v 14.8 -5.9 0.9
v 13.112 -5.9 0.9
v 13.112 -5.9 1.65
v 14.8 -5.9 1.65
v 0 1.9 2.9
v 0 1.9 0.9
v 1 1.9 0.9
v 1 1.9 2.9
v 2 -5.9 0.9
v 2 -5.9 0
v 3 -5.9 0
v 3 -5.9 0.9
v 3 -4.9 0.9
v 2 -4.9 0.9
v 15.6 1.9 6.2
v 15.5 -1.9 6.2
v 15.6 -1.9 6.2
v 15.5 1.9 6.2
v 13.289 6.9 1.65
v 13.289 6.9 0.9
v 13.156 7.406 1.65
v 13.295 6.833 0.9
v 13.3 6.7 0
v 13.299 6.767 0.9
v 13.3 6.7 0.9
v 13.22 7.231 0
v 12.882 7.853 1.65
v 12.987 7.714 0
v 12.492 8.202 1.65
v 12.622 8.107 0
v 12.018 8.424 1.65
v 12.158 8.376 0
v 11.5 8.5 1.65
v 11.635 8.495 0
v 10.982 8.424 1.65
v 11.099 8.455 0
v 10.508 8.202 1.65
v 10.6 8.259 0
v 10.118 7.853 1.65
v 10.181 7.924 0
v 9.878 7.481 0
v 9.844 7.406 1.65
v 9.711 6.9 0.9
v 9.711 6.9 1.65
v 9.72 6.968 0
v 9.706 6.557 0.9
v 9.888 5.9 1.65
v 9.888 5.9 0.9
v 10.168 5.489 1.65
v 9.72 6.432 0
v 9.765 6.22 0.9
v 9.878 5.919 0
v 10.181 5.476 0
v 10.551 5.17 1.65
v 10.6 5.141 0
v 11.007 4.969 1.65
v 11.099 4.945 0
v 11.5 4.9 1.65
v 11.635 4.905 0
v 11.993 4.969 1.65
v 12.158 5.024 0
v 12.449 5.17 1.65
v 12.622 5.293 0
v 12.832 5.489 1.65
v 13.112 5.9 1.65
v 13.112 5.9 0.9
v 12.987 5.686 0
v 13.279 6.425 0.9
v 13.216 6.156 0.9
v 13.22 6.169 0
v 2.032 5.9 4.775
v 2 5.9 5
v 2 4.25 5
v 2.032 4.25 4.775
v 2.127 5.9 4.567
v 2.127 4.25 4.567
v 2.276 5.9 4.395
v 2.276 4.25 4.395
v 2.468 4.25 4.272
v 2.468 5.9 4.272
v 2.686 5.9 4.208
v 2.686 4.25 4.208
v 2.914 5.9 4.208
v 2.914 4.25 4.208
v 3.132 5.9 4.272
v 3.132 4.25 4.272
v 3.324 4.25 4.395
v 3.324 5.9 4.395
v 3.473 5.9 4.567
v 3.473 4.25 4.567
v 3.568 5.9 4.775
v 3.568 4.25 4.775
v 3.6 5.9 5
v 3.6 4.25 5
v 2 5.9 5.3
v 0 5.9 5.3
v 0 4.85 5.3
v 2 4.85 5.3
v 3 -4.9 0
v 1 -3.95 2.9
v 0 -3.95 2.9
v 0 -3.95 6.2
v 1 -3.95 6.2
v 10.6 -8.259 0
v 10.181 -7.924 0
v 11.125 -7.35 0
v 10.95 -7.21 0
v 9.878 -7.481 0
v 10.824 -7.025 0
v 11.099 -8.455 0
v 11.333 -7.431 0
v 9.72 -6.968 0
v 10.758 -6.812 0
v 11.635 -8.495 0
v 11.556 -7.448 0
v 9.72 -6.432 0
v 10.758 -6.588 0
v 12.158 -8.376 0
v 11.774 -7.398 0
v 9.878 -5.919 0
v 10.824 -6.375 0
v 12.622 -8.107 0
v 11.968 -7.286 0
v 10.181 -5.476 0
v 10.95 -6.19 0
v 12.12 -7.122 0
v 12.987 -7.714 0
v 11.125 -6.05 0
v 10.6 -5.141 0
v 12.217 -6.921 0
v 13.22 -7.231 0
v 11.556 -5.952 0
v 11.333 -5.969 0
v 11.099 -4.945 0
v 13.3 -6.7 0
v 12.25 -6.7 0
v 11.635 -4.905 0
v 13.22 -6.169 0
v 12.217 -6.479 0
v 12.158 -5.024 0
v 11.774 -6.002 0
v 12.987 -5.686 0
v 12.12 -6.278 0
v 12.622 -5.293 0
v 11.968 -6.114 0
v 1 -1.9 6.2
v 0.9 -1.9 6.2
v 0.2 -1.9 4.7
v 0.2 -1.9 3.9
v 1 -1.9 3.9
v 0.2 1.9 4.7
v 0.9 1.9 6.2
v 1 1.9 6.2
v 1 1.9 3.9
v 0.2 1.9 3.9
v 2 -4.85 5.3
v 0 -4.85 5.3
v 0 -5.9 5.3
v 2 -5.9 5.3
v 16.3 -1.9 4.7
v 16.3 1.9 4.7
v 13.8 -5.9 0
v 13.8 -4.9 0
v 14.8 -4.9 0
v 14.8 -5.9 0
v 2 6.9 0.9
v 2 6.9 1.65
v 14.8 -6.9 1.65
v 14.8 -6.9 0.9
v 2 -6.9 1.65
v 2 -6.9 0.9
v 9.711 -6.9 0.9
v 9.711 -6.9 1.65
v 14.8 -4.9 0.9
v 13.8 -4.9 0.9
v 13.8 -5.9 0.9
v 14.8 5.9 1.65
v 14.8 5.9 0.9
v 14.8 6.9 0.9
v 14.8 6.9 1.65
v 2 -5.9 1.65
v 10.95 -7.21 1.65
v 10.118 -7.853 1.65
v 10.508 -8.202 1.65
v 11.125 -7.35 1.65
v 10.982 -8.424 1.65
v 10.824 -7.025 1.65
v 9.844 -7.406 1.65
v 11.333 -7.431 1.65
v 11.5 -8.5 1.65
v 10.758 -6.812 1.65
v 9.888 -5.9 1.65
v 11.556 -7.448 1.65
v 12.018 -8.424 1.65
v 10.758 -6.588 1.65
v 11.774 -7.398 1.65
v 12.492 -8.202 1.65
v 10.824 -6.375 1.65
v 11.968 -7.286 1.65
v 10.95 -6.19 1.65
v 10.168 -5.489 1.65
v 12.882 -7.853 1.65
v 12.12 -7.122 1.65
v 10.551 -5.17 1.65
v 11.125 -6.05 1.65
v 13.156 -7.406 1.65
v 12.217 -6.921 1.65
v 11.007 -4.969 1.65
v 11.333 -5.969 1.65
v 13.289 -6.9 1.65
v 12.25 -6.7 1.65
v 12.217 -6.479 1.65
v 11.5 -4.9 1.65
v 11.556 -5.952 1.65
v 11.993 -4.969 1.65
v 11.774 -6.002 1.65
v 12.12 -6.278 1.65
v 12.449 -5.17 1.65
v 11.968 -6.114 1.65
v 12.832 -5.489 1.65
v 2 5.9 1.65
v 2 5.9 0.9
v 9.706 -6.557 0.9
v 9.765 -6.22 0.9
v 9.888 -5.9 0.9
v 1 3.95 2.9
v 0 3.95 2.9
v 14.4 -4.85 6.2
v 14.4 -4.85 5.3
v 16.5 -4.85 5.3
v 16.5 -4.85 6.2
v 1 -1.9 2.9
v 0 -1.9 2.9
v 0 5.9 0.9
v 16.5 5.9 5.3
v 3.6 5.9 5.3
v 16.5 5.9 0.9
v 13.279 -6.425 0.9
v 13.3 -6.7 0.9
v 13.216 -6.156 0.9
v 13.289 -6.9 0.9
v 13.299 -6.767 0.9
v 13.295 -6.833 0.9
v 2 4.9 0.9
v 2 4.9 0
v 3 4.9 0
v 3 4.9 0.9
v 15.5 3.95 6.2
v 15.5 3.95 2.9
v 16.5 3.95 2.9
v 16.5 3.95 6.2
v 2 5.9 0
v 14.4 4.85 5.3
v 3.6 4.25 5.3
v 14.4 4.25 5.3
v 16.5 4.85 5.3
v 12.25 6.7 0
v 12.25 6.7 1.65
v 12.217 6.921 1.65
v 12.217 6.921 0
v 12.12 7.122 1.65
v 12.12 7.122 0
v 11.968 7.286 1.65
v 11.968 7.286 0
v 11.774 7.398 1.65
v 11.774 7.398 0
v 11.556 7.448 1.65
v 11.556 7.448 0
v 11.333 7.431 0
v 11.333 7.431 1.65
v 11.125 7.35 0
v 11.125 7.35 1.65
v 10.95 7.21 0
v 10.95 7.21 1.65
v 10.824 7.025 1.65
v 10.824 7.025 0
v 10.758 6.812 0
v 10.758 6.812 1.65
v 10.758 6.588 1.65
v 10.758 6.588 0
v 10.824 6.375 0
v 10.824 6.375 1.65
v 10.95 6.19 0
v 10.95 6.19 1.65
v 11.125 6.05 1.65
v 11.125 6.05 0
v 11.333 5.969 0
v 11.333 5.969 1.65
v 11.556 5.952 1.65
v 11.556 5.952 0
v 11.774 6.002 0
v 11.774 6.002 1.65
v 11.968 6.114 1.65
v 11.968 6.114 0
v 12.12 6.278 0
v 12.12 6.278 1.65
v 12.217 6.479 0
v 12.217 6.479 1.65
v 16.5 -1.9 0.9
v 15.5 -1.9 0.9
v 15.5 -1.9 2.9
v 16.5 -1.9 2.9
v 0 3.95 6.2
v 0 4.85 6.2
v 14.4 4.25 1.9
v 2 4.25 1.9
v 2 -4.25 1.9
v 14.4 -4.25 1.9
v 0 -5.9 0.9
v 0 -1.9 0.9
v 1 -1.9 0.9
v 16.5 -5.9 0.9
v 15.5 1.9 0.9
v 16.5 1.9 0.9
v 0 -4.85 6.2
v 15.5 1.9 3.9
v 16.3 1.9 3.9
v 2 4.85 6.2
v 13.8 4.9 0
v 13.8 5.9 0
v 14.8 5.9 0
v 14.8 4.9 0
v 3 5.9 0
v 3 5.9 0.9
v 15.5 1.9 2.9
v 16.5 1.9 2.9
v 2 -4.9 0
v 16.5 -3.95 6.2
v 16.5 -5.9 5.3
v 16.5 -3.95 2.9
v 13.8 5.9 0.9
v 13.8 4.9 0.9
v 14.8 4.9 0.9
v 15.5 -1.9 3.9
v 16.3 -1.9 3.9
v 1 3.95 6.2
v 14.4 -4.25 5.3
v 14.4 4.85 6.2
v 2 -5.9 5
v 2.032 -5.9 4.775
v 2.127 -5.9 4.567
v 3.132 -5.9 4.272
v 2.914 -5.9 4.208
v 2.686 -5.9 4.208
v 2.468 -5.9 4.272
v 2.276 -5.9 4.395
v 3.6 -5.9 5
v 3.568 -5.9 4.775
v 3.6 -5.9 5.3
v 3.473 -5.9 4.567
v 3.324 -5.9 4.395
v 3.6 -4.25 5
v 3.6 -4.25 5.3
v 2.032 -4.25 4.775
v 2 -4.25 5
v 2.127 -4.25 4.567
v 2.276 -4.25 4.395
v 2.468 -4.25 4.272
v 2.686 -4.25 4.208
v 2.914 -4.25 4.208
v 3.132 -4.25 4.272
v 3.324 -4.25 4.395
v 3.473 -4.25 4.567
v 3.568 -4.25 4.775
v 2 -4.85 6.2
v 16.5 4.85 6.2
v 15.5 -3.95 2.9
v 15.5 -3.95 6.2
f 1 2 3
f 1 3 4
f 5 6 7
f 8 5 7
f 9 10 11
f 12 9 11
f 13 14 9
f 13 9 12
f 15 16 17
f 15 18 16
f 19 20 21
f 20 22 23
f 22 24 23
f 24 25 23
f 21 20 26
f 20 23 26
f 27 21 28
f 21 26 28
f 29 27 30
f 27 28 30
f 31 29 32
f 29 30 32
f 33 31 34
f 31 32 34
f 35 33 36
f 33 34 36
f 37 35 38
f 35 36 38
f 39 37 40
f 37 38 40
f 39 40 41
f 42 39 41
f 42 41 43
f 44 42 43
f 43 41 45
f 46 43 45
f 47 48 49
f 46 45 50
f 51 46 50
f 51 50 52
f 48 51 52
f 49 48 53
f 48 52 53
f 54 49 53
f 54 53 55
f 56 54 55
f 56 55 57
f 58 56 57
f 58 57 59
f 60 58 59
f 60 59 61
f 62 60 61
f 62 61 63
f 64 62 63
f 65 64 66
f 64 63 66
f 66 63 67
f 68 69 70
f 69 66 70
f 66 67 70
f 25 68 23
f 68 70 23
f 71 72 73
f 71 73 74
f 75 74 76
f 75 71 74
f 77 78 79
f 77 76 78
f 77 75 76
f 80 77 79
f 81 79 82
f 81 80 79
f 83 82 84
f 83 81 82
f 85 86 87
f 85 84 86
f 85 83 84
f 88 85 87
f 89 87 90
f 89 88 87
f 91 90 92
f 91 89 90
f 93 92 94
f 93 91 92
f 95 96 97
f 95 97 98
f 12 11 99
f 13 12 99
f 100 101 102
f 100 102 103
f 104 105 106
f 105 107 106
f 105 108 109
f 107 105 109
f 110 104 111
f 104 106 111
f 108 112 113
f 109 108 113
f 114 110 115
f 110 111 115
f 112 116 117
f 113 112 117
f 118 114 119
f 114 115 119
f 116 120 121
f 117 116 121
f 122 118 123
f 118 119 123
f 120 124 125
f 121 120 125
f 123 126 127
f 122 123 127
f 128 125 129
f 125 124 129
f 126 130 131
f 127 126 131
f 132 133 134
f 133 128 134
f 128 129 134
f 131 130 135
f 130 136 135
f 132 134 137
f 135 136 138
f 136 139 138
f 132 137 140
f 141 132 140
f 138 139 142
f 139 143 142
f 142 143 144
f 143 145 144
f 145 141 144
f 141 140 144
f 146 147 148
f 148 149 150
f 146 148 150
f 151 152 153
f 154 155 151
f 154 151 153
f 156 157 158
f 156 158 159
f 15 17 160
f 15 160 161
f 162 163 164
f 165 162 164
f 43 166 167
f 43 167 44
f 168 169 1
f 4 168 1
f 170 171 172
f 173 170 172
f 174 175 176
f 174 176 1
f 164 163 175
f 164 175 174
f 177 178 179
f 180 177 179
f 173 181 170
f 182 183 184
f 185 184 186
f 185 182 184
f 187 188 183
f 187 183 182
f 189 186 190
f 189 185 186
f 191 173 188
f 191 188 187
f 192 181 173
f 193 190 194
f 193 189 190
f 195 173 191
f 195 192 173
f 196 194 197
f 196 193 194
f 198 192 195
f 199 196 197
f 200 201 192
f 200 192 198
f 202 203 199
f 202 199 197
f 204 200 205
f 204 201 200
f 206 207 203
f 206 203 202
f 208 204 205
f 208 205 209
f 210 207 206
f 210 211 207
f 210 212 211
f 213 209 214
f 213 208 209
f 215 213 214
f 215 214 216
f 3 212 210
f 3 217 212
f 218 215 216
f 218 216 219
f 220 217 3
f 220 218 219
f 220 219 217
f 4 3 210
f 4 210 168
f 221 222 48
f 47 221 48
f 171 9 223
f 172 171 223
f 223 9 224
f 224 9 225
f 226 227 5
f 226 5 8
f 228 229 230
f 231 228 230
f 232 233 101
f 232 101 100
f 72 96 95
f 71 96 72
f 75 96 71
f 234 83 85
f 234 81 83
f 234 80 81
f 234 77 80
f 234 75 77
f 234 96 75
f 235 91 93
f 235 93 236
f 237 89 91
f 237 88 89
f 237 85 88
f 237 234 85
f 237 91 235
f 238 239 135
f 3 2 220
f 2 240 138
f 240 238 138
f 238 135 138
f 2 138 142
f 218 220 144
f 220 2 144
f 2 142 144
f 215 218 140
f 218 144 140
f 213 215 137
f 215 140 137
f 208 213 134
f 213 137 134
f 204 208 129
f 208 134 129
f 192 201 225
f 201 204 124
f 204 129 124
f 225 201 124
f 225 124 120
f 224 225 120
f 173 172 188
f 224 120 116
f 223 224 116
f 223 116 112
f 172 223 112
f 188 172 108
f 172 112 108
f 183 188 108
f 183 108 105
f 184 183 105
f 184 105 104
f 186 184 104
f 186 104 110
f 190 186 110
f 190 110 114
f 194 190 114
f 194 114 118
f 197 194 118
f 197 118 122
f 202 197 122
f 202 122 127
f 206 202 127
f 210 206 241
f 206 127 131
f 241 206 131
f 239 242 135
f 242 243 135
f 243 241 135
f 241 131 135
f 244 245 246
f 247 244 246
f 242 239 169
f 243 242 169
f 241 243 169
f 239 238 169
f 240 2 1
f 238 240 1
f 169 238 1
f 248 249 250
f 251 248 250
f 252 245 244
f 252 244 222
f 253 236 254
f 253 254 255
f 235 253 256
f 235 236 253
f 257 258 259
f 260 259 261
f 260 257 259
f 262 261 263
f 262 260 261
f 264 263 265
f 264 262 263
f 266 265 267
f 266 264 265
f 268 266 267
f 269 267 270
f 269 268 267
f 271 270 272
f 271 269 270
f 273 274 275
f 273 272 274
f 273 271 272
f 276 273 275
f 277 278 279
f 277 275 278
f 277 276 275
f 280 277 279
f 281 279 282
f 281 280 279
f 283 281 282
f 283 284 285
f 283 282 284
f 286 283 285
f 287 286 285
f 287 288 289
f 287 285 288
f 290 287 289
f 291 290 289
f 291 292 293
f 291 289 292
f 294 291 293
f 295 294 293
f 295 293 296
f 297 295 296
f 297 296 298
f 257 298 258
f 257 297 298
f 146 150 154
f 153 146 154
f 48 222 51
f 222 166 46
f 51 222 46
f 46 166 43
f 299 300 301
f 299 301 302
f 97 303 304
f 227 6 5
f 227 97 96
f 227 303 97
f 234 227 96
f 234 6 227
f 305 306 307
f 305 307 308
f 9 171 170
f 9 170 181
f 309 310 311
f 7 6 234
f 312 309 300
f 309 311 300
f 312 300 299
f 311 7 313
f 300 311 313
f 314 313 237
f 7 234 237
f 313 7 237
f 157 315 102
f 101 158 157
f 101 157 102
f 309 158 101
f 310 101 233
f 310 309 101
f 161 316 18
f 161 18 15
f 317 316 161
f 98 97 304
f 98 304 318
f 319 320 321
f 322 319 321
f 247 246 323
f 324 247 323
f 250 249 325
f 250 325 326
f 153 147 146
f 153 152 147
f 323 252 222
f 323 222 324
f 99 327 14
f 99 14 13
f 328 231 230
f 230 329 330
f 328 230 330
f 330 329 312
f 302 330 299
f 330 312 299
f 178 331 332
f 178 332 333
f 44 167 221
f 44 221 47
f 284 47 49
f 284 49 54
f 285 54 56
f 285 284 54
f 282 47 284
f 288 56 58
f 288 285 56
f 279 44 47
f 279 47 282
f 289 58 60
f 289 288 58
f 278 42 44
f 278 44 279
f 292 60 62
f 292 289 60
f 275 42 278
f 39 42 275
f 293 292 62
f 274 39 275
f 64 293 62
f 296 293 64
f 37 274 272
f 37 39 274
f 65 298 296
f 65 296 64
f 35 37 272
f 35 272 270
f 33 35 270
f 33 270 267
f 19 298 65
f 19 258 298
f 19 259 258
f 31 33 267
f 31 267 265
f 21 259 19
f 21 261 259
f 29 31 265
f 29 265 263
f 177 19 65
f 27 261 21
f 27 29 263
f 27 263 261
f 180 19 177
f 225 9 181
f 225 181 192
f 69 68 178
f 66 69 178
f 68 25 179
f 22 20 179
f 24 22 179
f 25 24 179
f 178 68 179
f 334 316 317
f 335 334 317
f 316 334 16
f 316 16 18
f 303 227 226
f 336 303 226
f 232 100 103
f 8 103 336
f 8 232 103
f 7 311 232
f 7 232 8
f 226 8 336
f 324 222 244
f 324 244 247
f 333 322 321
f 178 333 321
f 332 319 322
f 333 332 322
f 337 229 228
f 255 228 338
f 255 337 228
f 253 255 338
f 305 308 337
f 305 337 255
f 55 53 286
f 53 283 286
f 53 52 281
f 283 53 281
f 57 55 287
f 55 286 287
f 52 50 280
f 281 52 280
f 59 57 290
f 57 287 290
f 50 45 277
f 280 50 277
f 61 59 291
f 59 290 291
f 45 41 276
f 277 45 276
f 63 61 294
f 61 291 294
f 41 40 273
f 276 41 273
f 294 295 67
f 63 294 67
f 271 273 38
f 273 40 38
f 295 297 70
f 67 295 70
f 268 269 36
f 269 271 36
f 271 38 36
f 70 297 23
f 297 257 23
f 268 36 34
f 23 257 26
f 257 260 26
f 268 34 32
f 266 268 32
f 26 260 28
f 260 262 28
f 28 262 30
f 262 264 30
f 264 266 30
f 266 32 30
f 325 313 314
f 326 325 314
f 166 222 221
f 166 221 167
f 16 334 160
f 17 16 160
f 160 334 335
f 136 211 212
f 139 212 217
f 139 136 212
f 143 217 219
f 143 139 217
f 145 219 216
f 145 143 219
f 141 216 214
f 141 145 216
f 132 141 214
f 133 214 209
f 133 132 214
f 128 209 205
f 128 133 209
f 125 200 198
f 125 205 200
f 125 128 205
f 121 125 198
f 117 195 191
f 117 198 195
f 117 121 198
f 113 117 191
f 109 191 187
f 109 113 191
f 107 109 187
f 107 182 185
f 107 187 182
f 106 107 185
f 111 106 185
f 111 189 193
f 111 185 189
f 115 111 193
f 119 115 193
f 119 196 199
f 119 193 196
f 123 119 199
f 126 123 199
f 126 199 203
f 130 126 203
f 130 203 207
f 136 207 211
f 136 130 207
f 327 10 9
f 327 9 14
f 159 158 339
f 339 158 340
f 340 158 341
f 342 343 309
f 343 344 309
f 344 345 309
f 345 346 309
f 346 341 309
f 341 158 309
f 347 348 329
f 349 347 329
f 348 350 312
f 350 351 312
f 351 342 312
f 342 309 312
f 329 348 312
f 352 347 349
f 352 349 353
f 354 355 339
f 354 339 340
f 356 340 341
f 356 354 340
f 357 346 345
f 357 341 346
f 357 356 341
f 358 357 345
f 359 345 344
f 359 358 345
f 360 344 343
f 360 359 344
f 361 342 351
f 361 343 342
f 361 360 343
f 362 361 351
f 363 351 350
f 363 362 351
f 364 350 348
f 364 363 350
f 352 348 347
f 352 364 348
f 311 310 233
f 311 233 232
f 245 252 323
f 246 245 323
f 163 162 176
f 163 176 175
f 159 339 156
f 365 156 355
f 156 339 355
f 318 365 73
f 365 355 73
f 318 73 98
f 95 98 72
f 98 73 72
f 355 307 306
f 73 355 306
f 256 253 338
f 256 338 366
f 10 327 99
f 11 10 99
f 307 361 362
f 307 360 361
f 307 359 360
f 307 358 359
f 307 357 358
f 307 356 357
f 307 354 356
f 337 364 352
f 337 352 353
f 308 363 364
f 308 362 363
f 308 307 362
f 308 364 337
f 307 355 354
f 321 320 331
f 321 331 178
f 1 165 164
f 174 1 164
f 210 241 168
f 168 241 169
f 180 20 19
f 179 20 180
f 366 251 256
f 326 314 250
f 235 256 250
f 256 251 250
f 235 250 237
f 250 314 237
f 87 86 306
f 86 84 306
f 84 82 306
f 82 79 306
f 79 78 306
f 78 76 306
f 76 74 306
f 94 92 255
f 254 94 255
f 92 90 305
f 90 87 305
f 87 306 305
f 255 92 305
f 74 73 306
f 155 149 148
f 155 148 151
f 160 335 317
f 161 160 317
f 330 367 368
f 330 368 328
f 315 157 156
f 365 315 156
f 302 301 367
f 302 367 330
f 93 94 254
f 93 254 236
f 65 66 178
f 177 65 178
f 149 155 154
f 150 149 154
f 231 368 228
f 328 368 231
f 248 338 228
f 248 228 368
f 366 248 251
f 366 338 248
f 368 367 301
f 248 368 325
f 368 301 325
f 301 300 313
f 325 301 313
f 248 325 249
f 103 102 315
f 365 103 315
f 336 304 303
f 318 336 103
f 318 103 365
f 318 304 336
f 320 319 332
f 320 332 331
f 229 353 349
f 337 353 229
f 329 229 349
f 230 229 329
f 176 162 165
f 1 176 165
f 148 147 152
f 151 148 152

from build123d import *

# Parameters (mm, degrees)
CYLINDER003_R     = 0.75
CYLINDER003_DEPTH = 10
CYLINDER_R        = 1.8
CYLINDER_DEPTH    = 1.65
BOX006_W          = 12.8
BOX006_H          = 1
BOX006_DEPTH      = 0.75
CYLINDER002_R     = 0.75
CYLINDER002_DEPTH = 10
BOX005_W          = 12.8
BOX005_H          = 1
BOX005_DEPTH      = 0.75
CYLINDER001_R     = 1.8
CYLINDER001_DEPTH = 1.65
BOX002_W          = 1
BOX002_H          = 1
BOX002_DEPTH      = 0.9
BOX003_W          = 1
BOX003_H          = 1
BOX003_DEPTH      = 0.9
BOX001_W          = 1
BOX001_H          = 1
BOX001_DEPTH      = 0.9
BOX004_W          = 1
BOX004_H          = 1
BOX004_DEPTH      = 0.9
BOX015_W          = 0.8
BOX015_H          = 3.8
BOX015_DEPTH      = 2.3
CHAMFER_SIZE2     = 0.7
CHAMFER_SIZE      = 1.5
BOX016_W          = 0.8
BOX016_H          = 3.8
BOX016_DEPTH      = 2.3
CHAMFER001_SIZE2  = 0.7
CHAMFER001_SIZE   = 1.5
BOX019_W          = 12.3
BOX019_H          = 9.7
BOX019_DEPTH      = 1
CYLINDER004_R     = 0.8
CYLINDER004_DEPTH = 20
BOX018_W          = 1.6
BOX018_H          = 20
BOX018_DEPTH      = 3
BOX017_W          = 12.4
BOX017_H          = 8.5
BOX017_DEPTH      = 4.3
BOX013_W          = 1
BOX013_H          = 2.05
BOX013_DEPTH      = 3.3
BOX014_W          = 1
BOX014_H          = 2.05
BOX014_DEPTH      = 3.3
BOX011_W          = 1
BOX011_H          = 2.05
BOX011_DEPTH      = 3.3
BOX012_W          = 1
BOX012_H          = 2.05
BOX012_DEPTH      = 3.3
BOX010_W          = 1
BOX010_H          = 3.8
BOX010_DEPTH      = 5.3
BOX009_W          = 1
BOX009_H          = 3.8
BOX009_DEPTH      = 5.3
BOX007_W          = 16.5
BOX007_H          = 1.05
BOX007_DEPTH      = 1
BOX008_W          = 16.5
BOX008_H          = 1.05
BOX008_DEPTH      = 1
BOX_W             = 16.5
BOX_H             = 11.8
BOX_DEPTH         = 5.3


with BuildPart() as cylinder003:
    # Cylinder003 → Cylinder003 (new body)
    with BuildSketch(Plane(origin=(11.5, -6.7, 0), x_dir=(1, 0, 0), z_dir=(0, 0, 1))):
        Circle(CYLINDER003_R)
    extrude(amount=CYLINDER003_DEPTH)


with BuildPart() as cylinder:
    # Cylinder → Cylinder (new body)
    with BuildSketch(Plane(origin=(11.5, -6.7, 0), x_dir=(1, 0, 0), z_dir=(0, 0, 1))):
        Circle(CYLINDER_R)
    extrude(amount=CYLINDER_DEPTH)


with BuildPart() as cut:
    # Box006 → Box006 (new body)
    with BuildSketch(Plane(origin=(2, -6.9, 0.9), x_dir=(1, 0, 0), z_dir=(0, 0, 1))):
        with Locations((6.4, 0.5)):
            Rectangle(BOX006_W, BOX006_H)
    extrude(amount=BOX006_DEPTH)

    # Fusion: union Cylinder
    add(cylinder.part)

    # Cut: cut Cylinder003
    add(cylinder003.part, mode=Mode.SUBTRACT)


with BuildPart() as cylinder002:
    # Cylinder002 → Cylinder002 (new body)
    with BuildSketch(Plane(origin=(11.5, 6.7, 0), x_dir=(1, 0, 0), z_dir=(0, 0, 1))):
        Circle(CYLINDER002_R)
    extrude(amount=CYLINDER002_DEPTH)


with BuildPart() as sk1:
    # Box005 → Box005 (new body)
    with BuildSketch(Plane(origin=(2, 5.9, 0.9), x_dir=(1, 0, 0), z_dir=(0, 0, 1))):
        with Locations((6.4, 0.5)):
            Rectangle(BOX005_W, BOX005_H)
    extrude(amount=BOX005_DEPTH)


with BuildPart() as cut001:
    # Cylinder001 → Cylinder001 (new body)
    with BuildSketch(Plane(origin=(11.5, 6.7, 0), x_dir=(1, 0, 0), z_dir=(0, 0, 1))):
        Circle(CYLINDER001_R)
    extrude(amount=CYLINDER001_DEPTH)

    # Fusion001: union sk1
    add(sk1.part)

    # Cut001: cut Cylinder002
    add(cylinder002.part, mode=Mode.SUBTRACT)


with BuildPart() as cube002:
    # Box002 → Box002 (new body)
    with BuildSketch(Plane(origin=(13.8, 4.9, 0), x_dir=(1, 0, 0), z_dir=(0, 0, 1))):
        with Locations((0.5, 0.5)):
            Rectangle(BOX002_W, BOX002_H)
    extrude(amount=BOX002_DEPTH)


with BuildPart() as cube003:
    # Box003 → Box003 (new body)
    with BuildSketch(Plane(origin=(2, -5.9, 0), x_dir=(1, 0, 0), z_dir=(0, 0, 1))):
        with Locations((0.5, 0.5)):
            Rectangle(BOX003_W, BOX003_H)
    extrude(amount=BOX003_DEPTH)


with BuildPart() as cube001:
    # Box001 → Box001 (new body)
    with BuildSketch(Plane(origin=(2, 4.9, 0), x_dir=(1, 0, 0), z_dir=(0, 0, 1))):
        with Locations((0.5, 0.5)):
            Rectangle(BOX001_W, BOX001_H)
    extrude(amount=BOX001_DEPTH)


with BuildPart() as pods:
    # Box004 → Box004 (new body)
    with BuildSketch(Plane(origin=(13.8, -5.9, 0), x_dir=(1, 0, 0), z_dir=(0, 0, 1))):
        with Locations((0.5, 0.5)):
            Rectangle(BOX004_W, BOX004_H)
    extrude(amount=BOX004_DEPTH)

    # Fusion004: union Cube002, Cube003, Cube001
    add(cube002.part)
    add(cube003.part)
    add(cube001.part)


with BuildPart() as chamfer_body:
    # Box015 → Box015 (new body)
    with BuildSketch(Plane(origin=(0.2, -1.9, 3.9), x_dir=(1, 0, 0), z_dir=(0, 0, 1))):
        with Locations((0.4, 1.9)):
            Rectangle(BOX015_W, BOX015_H)
    extrude(amount=BOX015_DEPTH)

    # Chamfer
    chamfer_edges = [chamfer_body.edges().sort_by_distance(p)[0] for p in [
        (0.2, 0, 6.2),
    ]]
    chamfer_side = chamfer_body.faces().sort_by_distance((0.2, 0, 5.05))[0]
    chamfer(chamfer_edges, length=CHAMFER_SIZE, length2=CHAMFER_SIZE2, reference=chamfer_side)


with BuildPart() as chamfer001:
    # Box016 → Box016 (new body)
    with BuildSketch(Plane(origin=(15.5, -1.9, 3.9), x_dir=(1, 0, 0), z_dir=(0, 0, 1))):
        with Locations((0.4, 1.9)):
            Rectangle(BOX016_W, BOX016_H)
    extrude(amount=BOX016_DEPTH)

    # Chamfer001
    chamfer001_edges = [chamfer001.edges().sort_by_distance(p)[0] for p in [
        (16.3, 0, 6.2),
    ]]
    chamfer001_side = chamfer001.faces().sort_by_distance((16.3, 0, 5.05))[0]
    chamfer(chamfer001_edges, length=CHAMFER001_SIZE, length2=CHAMFER001_SIZE2, reference=chamfer001_side)


with BuildPart() as cube016:
    # Box019 → Box019 (new body)
    with BuildSketch(Plane(origin=(2.1, -4.85, 5.3), x_dir=(1, 0, 0), z_dir=(0, 0, 1))):
        with Locations((6.15, 4.85)):
            Rectangle(BOX019_W, BOX019_H)
    extrude(amount=BOX019_DEPTH)


with BuildPart() as cylinder004:
    # Cylinder004 → Cylinder004 (new body)
    with BuildSketch(Plane(origin=(2.8, 10, 5), x_dir=(1, 0, 0), z_dir=(0, -1, 0))):
        Circle(CYLINDER004_R)
    extrude(amount=CYLINDER004_DEPTH)


with BuildPart() as fusion005:
    # Box018 → Box018 (new body)
    with BuildSketch(Plane(origin=(2, -10, 5), x_dir=(1, 0, 0), z_dir=(0, 0, 1))):
        with Locations((0.8, 10)):
            Rectangle(BOX018_W, BOX018_H)
    extrude(amount=BOX018_DEPTH)

    # Fusion005: union Cylinder004
    add(cylinder004.part)


with BuildPart() as cube:
    # Box017 → Box017 (new body)
    with BuildSketch(Plane(origin=(2, -4.25, 1.9), x_dir=(1, 0, 0), z_dir=(0, 0, 1))):
        with Locations((6.2, 4.25)):
            Rectangle(BOX017_W, BOX017_H)
    extrude(amount=BOX017_DEPTH)


with BuildPart() as cube011:
    # Box013 → Box013 (new body)
    with BuildSketch(Plane(origin=(0, 1.9, 2.9), x_dir=(1, 0, 0), z_dir=(0, 0, 1))):
        with Locations((0.5, 1.025)):
            Rectangle(BOX013_W, BOX013_H)
    extrude(amount=BOX013_DEPTH)


with BuildPart() as cube012:
    # Box014 → Box014 (new body)
    with BuildSketch(Plane(origin=(0, -3.95, 2.9), x_dir=(1, 0, 0), z_dir=(0, 0, 1))):
        with Locations((0.5, 1.025)):
            Rectangle(BOX014_W, BOX014_H)
    extrude(amount=BOX014_DEPTH)


with BuildPart() as cube009:
    # Box011 → Box011 (new body)
    with BuildSketch(Plane(origin=(15.5, -3.95, 2.9), x_dir=(1, 0, 0), z_dir=(0, 0, 1))):
        with Locations((0.5, 1.025)):
            Rectangle(BOX011_W, BOX011_H)
    extrude(amount=BOX011_DEPTH)


with BuildPart() as cube010:
    # Box012 → Box012 (new body)
    with BuildSketch(Plane(origin=(15.5, 1.9, 2.9), x_dir=(1, 0, 0), z_dir=(0, 0, 1))):
        with Locations((0.5, 1.025)):
            Rectangle(BOX012_W, BOX012_H)
    extrude(amount=BOX012_DEPTH)


with BuildPart() as cube008:
    # Box010 → Box010 (new body)
    with BuildSketch(Plane(origin=(15.5, -1.9, 0.9), x_dir=(1, 0, 0), z_dir=(0, 0, 1))):
        with Locations((0.5, 1.9)):
            Rectangle(BOX010_W, BOX010_H)
    extrude(amount=BOX010_DEPTH)


with BuildPart() as fusion003:
    # Box009 → Box009 (new body)
    with BuildSketch(Plane(origin=(0, -1.9, 0.9), x_dir=(1, 0, 0), z_dir=(0, 0, 1))):
        with Locations((0.5, 1.9)):
            Rectangle(BOX009_W, BOX009_H)
    extrude(amount=BOX009_DEPTH)

    # Fusion003: union Cube011, Cube012, Cube009, Cube010, Cube008
    add(cube011.part)
    add(cube012.part)
    add(cube009.part)
    add(cube010.part)
    add(cube008.part)


with BuildPart() as cube005:
    # Box007 → Box007 (new body)
    with BuildSketch(Plane(origin=(0, 4.85, 5.3), x_dir=(1, 0, 0), z_dir=(0, 0, 1))):
        with Locations((8.25, 0.525)):
            Rectangle(BOX007_W, BOX007_H)
    extrude(amount=BOX007_DEPTH)


with BuildPart() as fusion002:
    # Box008 → Box008 (new body)
    with BuildSketch(Plane(origin=(0, -5.9, 5.3), x_dir=(1, 0, 0), z_dir=(0, 0, 1))):
        with Locations((8.25, 0.525)):
            Rectangle(BOX008_W, BOX008_H)
    extrude(amount=BOX008_DEPTH)

    # Fusion002: union Cube005
    add(cube005.part)


with BuildPart() as cut006:
    # Box → Box (new body)
    with BuildSketch(Plane(origin=(0, -5.9, 0.9), x_dir=(1, 0, 0), z_dir=(0, 0, 1))):
        with Locations((8.25, 5.9)):
            Rectangle(BOX_W, BOX_H)
    extrude(amount=BOX_DEPTH)

    # Cut002: cut Fusion002
    add(fusion002.part, mode=Mode.SUBTRACT)

    # Cut003: cut Fusion003
    add(fusion003.part, mode=Mode.SUBTRACT)

    # Cut004: cut Cube
    add(cube.part, mode=Mode.SUBTRACT)

    # Cut005: cut Fusion005
    add(fusion005.part, mode=Mode.SUBTRACT)

    # Cut006: cut Cube016
    add(cube016.part, mode=Mode.SUBTRACT)


solid = Compound([cut.part, cut001.part, pods.part, chamfer_body.part, chamfer001.part, cut006.part])
